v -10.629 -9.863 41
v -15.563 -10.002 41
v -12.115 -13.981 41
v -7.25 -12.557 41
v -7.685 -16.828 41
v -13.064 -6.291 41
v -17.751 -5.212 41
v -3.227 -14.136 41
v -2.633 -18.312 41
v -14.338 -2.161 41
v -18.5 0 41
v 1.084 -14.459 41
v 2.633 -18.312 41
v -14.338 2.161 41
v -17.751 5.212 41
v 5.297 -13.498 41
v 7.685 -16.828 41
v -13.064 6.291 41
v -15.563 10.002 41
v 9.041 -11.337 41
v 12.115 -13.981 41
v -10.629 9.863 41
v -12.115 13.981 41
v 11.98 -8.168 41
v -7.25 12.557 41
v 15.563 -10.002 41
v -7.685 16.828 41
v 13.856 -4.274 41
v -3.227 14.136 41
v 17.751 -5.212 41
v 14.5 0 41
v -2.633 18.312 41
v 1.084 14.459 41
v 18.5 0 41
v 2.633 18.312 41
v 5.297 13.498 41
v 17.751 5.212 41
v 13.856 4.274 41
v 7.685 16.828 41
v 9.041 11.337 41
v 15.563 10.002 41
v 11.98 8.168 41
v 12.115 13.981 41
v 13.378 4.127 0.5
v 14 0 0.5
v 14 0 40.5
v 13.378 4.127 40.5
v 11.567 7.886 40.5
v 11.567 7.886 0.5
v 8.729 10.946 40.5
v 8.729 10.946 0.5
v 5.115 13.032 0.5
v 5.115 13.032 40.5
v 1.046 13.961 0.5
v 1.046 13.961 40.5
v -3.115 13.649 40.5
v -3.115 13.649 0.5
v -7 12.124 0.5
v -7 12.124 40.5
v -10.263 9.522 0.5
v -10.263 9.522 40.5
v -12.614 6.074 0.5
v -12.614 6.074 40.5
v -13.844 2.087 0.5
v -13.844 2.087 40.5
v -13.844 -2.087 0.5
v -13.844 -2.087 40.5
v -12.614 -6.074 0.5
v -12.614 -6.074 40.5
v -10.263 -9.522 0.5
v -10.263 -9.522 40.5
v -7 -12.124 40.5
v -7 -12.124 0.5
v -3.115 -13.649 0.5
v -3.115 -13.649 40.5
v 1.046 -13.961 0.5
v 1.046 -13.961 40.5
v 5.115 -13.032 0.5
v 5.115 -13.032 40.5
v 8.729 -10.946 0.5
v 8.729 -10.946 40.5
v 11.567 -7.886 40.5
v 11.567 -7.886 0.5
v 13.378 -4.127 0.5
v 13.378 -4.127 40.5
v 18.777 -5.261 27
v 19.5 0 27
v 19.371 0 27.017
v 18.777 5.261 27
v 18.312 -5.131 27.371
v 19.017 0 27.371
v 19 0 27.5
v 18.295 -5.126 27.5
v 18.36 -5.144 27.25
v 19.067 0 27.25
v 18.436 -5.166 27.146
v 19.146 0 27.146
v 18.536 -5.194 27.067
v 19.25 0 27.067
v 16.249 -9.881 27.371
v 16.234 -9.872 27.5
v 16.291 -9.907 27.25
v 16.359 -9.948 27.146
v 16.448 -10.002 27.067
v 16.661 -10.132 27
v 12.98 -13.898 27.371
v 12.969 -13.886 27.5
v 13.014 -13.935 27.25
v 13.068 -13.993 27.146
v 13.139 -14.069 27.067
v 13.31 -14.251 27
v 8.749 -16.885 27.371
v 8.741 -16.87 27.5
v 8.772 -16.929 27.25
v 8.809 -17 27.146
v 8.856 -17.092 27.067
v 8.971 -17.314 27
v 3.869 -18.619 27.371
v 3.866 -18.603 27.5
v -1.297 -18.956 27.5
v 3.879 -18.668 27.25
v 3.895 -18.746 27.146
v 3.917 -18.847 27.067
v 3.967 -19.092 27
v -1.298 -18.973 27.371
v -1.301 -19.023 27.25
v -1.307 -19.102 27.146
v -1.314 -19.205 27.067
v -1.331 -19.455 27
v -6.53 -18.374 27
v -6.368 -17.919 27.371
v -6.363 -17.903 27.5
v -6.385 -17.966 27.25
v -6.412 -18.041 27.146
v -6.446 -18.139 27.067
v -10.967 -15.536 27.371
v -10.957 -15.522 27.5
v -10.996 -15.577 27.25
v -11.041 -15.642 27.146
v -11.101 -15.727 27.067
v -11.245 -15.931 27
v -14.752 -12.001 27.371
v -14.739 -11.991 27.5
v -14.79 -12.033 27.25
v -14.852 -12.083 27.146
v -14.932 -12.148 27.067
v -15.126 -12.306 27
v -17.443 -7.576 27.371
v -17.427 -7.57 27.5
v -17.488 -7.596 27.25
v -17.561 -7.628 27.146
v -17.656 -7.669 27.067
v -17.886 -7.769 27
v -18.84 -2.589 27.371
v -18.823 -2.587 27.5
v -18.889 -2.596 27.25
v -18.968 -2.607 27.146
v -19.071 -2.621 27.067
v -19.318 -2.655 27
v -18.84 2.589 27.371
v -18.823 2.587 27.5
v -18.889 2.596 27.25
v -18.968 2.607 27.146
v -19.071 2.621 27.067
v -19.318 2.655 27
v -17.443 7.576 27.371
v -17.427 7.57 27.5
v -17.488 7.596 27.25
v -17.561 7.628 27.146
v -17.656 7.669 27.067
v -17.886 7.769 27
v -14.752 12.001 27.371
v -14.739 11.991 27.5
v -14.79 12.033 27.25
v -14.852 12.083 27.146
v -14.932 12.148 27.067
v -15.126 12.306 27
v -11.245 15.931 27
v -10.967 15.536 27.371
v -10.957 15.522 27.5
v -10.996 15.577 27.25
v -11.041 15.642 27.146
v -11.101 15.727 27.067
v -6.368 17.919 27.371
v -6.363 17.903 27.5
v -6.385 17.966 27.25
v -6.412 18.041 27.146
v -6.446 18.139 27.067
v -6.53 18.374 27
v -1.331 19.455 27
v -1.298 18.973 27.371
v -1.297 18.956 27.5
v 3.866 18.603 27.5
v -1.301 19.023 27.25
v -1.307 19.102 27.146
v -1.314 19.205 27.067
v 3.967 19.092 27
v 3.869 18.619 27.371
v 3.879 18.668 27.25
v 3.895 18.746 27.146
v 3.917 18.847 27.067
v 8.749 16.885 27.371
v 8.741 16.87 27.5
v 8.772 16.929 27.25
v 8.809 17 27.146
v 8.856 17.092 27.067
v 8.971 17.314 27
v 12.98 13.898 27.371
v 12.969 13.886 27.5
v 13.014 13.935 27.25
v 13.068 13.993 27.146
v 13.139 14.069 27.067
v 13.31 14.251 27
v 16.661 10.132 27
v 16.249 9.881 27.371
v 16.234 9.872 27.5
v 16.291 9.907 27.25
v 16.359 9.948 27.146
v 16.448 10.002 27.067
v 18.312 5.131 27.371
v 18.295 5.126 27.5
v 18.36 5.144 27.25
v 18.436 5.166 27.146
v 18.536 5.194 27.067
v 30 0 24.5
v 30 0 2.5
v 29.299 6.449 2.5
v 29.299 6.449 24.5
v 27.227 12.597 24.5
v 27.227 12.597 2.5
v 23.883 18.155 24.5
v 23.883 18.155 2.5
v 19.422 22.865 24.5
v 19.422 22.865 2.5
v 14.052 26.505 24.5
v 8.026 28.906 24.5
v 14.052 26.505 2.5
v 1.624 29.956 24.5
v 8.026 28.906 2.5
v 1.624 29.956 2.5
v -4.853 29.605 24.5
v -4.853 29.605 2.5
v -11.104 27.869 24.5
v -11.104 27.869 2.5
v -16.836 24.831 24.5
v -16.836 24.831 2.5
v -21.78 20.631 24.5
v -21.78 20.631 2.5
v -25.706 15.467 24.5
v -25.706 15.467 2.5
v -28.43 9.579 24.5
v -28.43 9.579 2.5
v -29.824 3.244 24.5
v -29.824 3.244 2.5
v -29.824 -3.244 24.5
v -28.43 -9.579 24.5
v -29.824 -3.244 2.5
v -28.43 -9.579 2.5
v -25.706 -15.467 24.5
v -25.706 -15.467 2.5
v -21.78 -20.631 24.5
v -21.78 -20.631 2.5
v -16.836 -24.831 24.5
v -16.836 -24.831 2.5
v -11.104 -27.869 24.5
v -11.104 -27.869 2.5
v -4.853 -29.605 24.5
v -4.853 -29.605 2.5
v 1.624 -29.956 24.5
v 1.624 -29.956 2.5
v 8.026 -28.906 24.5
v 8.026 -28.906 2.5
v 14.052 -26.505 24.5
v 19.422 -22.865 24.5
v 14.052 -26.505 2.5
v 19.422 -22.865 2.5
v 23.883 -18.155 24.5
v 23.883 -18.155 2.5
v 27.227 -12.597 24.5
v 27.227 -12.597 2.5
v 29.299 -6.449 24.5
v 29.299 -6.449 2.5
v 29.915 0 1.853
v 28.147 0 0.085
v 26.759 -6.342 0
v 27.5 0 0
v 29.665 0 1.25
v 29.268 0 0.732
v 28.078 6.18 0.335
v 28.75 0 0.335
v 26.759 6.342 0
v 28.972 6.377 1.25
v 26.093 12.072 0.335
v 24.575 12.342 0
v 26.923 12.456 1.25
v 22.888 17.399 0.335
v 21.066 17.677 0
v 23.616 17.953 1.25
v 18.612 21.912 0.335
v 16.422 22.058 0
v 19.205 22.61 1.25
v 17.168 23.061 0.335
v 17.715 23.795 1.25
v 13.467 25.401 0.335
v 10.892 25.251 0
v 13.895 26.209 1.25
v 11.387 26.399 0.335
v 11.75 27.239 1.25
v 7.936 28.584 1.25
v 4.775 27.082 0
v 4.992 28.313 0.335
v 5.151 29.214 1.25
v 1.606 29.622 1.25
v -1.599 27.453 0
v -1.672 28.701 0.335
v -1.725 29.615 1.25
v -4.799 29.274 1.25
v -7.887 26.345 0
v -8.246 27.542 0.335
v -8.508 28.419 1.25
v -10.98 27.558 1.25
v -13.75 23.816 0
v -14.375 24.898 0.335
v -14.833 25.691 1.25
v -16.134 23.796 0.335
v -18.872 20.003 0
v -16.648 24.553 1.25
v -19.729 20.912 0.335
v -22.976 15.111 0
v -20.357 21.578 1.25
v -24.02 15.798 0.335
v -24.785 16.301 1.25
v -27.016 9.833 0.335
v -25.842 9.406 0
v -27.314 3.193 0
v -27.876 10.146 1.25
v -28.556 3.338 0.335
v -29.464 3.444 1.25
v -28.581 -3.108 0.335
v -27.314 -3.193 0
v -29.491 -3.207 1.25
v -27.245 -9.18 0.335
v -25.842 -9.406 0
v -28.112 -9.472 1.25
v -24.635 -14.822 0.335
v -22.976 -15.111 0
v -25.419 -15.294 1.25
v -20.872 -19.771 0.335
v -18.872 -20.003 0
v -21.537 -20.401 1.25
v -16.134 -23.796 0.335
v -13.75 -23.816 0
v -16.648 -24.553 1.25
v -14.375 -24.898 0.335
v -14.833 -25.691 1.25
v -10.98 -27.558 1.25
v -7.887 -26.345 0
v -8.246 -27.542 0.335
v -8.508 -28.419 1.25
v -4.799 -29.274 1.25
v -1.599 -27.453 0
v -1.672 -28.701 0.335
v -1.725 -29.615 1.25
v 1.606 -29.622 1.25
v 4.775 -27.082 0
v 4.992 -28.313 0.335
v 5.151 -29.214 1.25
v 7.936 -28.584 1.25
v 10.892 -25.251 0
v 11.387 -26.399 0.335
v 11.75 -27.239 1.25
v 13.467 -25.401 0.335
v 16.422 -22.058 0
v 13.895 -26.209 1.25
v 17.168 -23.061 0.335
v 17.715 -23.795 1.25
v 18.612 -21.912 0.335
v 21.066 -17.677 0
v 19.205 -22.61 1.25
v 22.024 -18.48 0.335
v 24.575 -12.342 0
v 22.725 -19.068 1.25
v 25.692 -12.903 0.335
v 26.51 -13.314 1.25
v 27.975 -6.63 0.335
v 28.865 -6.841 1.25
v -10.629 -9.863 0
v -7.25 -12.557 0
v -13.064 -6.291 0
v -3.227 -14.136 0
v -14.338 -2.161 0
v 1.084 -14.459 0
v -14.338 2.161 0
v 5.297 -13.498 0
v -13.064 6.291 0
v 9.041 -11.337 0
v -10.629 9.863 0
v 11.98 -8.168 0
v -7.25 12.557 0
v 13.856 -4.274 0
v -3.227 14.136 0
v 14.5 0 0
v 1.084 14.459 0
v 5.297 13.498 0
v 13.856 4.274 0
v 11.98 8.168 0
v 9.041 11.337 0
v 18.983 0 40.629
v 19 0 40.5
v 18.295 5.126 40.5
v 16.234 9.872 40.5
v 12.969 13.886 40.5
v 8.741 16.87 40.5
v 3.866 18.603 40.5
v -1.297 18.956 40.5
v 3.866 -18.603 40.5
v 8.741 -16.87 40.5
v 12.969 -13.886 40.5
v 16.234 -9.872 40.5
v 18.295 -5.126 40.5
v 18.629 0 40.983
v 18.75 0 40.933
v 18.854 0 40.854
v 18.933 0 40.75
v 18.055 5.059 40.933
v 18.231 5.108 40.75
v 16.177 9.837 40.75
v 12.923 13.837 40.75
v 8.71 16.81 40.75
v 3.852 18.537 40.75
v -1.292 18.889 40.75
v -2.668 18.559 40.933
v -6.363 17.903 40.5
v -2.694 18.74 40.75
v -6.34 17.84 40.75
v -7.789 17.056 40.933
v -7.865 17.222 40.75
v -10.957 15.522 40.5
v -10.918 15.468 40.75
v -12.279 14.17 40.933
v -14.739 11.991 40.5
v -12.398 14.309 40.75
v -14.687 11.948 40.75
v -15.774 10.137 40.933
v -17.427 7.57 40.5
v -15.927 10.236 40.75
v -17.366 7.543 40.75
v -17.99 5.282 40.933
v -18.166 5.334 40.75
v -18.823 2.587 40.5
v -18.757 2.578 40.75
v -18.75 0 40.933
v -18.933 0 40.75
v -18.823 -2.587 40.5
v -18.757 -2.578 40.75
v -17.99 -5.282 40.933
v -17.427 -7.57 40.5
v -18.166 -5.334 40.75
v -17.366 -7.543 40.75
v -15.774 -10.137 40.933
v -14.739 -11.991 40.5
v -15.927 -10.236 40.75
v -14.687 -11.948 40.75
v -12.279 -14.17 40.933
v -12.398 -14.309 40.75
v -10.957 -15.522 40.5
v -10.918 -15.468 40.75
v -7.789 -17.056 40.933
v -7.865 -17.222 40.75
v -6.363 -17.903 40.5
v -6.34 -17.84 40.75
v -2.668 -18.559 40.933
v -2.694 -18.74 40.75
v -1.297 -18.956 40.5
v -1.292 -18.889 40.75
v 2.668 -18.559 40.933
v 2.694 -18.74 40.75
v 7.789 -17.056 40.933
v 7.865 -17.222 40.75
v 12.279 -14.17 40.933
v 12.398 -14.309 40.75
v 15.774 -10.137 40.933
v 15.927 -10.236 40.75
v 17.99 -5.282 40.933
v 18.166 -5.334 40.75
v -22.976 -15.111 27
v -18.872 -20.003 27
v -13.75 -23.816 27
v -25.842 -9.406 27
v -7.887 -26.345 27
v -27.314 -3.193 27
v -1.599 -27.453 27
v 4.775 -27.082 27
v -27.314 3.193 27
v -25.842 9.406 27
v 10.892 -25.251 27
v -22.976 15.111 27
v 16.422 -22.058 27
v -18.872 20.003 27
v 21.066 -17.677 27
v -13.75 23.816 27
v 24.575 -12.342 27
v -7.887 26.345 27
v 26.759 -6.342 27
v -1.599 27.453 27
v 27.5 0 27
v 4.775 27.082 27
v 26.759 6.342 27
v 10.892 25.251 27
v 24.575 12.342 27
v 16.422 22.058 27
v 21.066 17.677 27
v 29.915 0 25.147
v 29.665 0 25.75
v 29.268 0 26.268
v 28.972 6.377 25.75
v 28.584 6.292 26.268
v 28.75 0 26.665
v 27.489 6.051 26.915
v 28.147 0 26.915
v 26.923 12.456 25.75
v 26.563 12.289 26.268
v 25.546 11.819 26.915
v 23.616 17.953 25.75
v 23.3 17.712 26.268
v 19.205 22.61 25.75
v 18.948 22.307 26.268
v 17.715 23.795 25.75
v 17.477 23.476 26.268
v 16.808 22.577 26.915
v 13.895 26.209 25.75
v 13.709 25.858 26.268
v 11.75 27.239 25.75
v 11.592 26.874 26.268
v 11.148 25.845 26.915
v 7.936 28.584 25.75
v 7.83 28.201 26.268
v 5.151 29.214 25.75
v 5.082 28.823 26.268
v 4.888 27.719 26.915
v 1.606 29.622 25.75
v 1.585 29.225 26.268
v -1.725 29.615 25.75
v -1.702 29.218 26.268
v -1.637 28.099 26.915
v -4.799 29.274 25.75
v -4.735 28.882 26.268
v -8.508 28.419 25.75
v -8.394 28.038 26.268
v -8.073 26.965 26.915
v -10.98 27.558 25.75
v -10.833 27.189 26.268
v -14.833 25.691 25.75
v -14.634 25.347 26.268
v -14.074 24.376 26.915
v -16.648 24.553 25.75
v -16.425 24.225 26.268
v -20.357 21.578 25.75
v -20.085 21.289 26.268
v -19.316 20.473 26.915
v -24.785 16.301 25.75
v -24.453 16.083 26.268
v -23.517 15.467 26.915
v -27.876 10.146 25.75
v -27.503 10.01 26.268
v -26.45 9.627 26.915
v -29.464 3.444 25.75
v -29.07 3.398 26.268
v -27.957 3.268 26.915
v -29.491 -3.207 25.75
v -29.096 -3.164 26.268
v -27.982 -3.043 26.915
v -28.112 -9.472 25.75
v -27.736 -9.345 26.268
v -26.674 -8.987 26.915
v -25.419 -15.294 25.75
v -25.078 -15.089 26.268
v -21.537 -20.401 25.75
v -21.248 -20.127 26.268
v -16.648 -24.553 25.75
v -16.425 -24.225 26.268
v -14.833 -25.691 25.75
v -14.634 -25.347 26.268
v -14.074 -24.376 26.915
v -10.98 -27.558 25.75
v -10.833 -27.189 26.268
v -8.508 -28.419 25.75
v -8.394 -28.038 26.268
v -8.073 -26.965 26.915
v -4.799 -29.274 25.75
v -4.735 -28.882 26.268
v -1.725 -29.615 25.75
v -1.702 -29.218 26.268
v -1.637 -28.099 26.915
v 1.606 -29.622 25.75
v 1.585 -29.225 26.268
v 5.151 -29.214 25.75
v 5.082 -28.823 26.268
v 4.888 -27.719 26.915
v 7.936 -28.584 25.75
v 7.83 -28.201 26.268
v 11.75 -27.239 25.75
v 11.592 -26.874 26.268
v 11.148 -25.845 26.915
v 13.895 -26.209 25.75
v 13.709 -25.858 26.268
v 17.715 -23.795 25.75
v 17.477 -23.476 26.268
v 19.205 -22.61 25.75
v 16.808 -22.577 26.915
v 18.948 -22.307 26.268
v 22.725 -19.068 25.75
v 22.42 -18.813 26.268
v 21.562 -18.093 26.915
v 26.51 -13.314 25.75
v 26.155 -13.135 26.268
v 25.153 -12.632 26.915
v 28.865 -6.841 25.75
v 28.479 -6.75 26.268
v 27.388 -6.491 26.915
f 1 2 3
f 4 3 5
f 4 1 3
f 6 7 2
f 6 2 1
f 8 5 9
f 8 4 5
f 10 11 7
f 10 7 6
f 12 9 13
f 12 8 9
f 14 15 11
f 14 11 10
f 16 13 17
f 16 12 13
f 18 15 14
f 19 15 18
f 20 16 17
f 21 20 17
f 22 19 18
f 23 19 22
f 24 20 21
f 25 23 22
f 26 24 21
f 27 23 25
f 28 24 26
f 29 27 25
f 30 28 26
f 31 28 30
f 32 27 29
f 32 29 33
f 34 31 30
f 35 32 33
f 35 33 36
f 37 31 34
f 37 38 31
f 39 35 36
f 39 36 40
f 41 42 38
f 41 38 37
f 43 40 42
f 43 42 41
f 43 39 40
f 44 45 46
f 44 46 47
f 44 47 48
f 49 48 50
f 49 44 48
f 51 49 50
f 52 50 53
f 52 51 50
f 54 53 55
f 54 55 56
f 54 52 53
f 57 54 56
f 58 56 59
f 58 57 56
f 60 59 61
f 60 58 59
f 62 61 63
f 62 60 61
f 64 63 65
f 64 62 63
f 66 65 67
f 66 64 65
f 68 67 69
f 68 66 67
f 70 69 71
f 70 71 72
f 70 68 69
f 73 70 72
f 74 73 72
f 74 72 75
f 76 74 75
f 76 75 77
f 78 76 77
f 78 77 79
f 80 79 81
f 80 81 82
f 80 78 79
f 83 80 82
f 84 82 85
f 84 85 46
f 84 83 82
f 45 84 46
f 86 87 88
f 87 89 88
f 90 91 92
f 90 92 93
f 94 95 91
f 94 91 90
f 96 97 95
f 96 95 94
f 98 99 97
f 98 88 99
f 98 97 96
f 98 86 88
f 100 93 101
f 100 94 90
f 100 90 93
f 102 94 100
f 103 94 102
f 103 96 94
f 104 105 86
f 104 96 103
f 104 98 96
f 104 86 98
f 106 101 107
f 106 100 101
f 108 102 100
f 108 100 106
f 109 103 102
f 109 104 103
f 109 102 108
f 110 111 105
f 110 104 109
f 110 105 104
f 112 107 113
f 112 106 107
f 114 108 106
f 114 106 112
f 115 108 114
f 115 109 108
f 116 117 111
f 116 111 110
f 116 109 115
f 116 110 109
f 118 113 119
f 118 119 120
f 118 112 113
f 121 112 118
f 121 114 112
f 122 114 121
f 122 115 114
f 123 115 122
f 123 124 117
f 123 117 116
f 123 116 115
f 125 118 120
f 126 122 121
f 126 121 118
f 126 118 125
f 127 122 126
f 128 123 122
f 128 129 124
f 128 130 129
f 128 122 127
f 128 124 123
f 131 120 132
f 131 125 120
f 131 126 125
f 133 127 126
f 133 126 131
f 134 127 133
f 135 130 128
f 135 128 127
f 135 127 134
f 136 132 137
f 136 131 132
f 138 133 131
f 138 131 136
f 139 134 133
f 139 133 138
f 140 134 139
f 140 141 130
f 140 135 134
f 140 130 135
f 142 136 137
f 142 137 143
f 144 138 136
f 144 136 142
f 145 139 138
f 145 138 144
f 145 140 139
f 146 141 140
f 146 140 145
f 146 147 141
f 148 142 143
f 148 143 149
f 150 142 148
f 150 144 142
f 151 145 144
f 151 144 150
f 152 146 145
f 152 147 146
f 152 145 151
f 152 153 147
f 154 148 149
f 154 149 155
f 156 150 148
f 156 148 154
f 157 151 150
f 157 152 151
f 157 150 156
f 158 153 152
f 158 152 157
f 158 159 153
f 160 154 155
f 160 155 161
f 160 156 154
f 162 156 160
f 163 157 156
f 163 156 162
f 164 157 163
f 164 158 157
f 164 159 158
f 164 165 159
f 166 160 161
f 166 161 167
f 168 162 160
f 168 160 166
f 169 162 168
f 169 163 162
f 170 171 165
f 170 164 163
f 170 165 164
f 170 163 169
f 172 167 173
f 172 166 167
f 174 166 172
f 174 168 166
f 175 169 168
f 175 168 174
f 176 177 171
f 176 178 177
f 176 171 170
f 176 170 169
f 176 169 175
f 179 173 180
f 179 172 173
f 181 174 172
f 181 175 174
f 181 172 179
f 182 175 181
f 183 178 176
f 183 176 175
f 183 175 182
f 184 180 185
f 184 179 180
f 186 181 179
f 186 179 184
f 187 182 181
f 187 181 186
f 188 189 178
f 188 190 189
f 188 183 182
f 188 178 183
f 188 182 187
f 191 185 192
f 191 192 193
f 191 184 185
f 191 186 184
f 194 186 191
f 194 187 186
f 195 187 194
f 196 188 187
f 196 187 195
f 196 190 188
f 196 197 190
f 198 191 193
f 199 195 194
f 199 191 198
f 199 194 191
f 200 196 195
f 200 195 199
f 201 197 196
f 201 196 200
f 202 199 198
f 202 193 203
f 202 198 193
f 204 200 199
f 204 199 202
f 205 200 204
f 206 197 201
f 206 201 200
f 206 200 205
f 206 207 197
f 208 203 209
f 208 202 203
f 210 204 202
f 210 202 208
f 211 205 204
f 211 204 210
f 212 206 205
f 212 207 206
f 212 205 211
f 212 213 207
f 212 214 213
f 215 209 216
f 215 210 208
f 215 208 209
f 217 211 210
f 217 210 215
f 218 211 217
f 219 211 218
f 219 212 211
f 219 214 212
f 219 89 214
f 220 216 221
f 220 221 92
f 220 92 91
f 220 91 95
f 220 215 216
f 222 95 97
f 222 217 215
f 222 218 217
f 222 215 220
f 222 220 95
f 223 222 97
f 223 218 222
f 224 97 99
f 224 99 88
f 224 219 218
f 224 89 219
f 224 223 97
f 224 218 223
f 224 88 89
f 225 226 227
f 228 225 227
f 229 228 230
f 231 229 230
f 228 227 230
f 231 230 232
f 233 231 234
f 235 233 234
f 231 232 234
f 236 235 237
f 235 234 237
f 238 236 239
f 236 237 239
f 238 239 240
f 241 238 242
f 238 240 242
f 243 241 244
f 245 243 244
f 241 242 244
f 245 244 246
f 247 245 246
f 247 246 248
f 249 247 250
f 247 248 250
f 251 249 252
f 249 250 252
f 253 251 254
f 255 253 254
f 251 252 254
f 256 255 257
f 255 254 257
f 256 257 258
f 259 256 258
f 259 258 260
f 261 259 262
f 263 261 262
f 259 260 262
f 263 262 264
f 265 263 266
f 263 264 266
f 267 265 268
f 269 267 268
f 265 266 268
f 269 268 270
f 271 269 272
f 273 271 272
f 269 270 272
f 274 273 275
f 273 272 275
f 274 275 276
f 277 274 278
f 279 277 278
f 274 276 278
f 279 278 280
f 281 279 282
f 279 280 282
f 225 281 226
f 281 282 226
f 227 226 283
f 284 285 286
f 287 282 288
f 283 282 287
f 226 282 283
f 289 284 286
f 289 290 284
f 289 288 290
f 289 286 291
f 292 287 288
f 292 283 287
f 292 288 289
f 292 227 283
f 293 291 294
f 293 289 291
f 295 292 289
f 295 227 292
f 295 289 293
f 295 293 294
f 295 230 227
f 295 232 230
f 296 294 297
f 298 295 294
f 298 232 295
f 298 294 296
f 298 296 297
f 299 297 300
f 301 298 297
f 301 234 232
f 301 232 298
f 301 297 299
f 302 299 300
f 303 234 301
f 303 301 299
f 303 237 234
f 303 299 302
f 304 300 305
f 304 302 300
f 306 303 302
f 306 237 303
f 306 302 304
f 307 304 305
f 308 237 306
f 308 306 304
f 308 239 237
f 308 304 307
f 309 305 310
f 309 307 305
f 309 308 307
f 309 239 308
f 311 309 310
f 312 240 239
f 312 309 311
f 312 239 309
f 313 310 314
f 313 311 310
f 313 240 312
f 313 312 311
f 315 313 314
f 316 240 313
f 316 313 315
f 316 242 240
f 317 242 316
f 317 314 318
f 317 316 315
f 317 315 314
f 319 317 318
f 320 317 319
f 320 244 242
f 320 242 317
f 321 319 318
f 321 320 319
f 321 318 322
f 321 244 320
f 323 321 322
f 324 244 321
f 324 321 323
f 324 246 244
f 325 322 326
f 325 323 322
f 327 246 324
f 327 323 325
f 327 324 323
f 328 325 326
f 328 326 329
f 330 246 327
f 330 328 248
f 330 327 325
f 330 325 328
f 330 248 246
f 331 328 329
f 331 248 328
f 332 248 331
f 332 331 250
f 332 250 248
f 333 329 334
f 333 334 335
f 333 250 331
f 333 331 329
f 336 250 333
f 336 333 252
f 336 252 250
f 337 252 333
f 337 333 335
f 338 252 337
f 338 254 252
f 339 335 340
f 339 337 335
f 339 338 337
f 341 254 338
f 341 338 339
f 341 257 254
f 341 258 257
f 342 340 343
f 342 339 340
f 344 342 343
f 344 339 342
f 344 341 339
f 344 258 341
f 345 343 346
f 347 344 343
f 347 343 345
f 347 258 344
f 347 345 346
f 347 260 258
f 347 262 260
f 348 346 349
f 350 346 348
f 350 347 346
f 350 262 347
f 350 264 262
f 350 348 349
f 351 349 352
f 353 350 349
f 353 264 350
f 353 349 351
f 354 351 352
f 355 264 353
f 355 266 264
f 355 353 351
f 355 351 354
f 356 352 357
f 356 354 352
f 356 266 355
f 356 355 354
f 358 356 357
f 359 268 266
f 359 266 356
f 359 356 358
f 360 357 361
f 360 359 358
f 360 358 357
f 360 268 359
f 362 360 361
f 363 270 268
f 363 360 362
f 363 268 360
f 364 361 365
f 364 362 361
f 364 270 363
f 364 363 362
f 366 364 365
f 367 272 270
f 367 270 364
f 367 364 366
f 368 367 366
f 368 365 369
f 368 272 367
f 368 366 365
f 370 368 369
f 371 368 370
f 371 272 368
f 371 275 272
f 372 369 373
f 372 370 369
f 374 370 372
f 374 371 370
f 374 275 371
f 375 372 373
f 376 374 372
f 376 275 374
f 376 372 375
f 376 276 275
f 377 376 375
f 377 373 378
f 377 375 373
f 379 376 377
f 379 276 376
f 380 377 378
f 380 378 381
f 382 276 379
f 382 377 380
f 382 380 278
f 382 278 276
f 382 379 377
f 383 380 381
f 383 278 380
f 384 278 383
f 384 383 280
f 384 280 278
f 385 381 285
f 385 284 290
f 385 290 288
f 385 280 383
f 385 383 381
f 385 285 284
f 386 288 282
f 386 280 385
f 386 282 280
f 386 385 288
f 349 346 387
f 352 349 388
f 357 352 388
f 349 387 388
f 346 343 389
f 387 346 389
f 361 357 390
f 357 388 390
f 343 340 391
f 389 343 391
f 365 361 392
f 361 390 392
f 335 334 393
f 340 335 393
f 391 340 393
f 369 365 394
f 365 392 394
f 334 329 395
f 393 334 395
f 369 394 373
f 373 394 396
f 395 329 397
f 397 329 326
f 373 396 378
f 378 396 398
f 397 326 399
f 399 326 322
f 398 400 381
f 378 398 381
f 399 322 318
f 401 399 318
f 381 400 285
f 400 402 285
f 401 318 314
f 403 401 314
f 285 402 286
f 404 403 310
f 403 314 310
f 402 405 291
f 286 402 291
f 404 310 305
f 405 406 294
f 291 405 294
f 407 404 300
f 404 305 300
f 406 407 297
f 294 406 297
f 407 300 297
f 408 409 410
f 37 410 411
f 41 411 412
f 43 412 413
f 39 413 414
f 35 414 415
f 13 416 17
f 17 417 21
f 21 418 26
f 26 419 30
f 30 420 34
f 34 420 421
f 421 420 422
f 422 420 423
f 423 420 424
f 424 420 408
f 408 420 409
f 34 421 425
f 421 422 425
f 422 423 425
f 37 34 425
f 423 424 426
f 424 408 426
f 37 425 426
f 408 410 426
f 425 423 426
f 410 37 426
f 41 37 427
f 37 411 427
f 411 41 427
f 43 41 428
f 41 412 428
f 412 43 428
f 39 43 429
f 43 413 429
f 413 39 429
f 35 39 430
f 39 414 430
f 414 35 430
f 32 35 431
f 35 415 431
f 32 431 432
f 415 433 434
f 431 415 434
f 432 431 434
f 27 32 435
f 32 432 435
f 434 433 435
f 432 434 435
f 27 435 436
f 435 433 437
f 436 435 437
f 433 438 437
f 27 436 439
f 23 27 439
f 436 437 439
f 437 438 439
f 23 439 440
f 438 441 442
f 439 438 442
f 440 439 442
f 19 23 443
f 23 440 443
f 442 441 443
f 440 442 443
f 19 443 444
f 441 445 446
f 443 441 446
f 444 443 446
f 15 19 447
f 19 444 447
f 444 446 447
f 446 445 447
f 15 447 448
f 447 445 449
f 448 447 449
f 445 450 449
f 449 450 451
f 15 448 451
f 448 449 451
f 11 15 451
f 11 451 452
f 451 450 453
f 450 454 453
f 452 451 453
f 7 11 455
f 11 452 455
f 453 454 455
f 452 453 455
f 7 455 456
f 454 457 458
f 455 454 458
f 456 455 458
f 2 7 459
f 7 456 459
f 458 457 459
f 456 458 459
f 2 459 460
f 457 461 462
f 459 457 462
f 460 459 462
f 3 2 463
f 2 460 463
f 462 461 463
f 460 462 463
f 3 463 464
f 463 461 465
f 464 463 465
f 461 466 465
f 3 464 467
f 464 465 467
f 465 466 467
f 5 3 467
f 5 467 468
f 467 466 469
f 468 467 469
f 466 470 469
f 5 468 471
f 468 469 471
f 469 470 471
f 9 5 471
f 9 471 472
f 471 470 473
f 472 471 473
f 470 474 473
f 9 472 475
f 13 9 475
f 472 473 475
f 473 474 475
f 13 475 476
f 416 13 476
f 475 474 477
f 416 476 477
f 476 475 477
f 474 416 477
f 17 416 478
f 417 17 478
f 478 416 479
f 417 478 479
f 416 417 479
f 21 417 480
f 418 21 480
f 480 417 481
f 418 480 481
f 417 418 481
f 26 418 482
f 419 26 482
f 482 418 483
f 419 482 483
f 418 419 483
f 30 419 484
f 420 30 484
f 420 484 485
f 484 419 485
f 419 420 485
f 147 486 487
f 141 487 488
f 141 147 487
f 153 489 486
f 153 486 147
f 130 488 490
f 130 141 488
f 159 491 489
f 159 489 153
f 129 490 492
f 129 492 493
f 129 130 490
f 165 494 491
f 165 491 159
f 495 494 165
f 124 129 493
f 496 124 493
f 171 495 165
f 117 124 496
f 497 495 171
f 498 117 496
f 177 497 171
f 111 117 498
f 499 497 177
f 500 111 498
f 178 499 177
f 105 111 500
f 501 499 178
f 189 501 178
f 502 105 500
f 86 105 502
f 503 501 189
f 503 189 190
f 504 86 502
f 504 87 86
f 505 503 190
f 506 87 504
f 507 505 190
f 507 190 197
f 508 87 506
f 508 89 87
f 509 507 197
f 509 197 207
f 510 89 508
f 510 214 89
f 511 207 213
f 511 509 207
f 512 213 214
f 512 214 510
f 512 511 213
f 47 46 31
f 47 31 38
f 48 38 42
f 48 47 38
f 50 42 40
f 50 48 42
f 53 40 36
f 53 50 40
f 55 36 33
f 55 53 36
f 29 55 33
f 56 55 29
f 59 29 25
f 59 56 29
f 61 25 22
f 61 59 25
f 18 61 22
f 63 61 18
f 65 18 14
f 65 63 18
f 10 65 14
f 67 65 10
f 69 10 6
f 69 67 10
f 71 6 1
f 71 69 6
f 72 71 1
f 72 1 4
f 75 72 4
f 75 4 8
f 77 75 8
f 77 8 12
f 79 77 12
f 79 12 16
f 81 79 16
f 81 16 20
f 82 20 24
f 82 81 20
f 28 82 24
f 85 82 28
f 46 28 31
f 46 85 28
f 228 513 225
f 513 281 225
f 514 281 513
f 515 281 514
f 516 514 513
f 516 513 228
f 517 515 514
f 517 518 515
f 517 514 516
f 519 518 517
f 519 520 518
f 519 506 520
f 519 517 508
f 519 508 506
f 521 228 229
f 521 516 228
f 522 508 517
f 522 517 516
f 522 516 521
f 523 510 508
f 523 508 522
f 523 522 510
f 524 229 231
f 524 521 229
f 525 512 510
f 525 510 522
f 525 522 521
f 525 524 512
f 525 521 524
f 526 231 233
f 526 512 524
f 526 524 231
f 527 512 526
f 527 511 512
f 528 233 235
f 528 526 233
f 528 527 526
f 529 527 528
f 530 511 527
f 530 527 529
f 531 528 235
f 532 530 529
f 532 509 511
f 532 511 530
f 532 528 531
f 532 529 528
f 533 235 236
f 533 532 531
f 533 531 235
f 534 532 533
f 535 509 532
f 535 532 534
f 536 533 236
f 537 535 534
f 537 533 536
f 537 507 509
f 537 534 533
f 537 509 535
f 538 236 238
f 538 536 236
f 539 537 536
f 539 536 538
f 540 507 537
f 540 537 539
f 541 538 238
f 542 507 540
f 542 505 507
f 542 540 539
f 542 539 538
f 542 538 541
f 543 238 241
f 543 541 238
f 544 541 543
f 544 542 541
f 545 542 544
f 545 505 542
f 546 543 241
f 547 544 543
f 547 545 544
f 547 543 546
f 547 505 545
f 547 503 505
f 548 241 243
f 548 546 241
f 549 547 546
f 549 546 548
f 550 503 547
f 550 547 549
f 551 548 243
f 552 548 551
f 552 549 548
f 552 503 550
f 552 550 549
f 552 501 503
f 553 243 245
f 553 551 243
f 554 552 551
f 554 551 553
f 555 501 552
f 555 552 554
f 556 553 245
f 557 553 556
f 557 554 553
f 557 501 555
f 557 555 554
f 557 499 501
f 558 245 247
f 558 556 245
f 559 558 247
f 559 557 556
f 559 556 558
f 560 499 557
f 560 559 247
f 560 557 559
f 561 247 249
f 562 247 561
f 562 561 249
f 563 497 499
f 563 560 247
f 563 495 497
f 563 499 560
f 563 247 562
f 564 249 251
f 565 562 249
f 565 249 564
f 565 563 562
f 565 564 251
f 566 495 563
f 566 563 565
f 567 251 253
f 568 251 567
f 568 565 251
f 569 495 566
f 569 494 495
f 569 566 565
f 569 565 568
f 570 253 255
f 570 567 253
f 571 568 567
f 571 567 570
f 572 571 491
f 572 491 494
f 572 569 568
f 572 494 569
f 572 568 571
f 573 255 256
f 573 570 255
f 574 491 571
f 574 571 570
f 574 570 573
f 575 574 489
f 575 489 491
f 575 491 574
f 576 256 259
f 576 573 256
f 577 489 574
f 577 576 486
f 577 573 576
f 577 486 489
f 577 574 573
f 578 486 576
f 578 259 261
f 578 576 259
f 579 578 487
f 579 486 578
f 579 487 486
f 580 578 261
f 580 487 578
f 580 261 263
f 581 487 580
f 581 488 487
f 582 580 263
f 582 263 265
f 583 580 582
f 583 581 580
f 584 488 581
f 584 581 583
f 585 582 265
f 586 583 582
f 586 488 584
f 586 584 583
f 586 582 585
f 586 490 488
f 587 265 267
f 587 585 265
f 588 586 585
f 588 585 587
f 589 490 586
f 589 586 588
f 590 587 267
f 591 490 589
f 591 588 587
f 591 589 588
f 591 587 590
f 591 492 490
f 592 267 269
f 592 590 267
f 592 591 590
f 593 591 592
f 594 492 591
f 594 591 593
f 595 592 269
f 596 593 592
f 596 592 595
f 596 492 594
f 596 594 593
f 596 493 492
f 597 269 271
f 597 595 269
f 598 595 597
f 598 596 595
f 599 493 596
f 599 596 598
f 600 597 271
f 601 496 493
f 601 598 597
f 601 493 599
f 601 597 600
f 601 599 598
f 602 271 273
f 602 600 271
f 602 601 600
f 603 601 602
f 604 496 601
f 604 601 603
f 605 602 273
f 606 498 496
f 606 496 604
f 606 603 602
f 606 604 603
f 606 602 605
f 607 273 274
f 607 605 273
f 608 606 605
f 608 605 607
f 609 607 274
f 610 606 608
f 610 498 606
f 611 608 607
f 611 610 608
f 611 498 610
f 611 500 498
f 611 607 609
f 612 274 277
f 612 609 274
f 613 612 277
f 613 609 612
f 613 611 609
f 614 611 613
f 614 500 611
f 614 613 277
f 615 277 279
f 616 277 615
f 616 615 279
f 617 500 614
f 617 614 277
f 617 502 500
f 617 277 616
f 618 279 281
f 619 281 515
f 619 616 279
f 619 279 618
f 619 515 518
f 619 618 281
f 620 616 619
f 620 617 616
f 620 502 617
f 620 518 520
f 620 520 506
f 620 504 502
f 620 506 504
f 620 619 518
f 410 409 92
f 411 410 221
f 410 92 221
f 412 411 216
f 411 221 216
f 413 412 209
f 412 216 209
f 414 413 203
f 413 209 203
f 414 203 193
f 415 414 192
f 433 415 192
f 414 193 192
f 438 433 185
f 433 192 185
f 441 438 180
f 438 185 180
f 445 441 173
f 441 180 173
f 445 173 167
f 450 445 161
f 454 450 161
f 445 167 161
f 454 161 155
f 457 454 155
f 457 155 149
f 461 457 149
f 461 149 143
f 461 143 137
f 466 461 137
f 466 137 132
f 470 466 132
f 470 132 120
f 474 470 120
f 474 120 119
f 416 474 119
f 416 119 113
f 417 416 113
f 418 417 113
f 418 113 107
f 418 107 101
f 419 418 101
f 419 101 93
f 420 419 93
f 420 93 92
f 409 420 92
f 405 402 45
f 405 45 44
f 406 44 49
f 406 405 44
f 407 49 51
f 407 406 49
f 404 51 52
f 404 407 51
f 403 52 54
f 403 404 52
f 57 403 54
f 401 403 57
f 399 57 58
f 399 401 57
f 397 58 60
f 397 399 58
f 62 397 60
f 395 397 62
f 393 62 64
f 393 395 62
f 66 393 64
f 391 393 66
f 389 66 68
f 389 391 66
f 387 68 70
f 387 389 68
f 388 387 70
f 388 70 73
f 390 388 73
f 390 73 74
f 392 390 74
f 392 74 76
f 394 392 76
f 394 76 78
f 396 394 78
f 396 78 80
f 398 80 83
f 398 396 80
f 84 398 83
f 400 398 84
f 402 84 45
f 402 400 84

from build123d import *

# Parameters (mm, degrees)
F0_R     = 30
F0_R_2   = 19
F0_R_3   = 14
F1_DEPTH = 27
F2_DEPTH = 41
F3_R     = 2.5
F4_R     = 0.5
F5_SIZE  = 0.5


with BuildPart() as f1:
    # F0 (on Top) → F1 (new body)
    with BuildSketch(Plane.XY):
        Circle(F0_R)
        Circle(F0_R_2, mode=Mode.SUBTRACT)
        Circle(F0_R_2)
        Circle(F0_R_3, mode=Mode.SUBTRACT)
    extrude(amount=F1_DEPTH)

    # F0 (on Top) → F2 (join)
    with BuildSketch(Plane.XY):
        Circle(F0_R_2)
        Circle(F0_R_3, mode=Mode.SUBTRACT)
    extrude(amount=F2_DEPTH)

    # F3
    f3_edges = [f1.edges().sort_by_distance(p)[0] for p in [
        (-30, 0, 0),
        (-30, 0, 27),
    ]]
    fillet(f3_edges, radius=F3_R)

    # F4
    f4_edges = [f1.edges().sort_by_distance(p)[0] for p in [
        (-19, 0, 27),
        (-19, 0, 41),
    ]]
    fillet(f4_edges, radius=F4_R)

    # F5
    f5_edges = [f1.edges().sort_by_distance(p)[0] for p in [
        (-14, 0, 41),
        (-14, 0, 0),
    ]]
    chamfer(f5_edges, length=F5_SIZE)


solid = f1.part
